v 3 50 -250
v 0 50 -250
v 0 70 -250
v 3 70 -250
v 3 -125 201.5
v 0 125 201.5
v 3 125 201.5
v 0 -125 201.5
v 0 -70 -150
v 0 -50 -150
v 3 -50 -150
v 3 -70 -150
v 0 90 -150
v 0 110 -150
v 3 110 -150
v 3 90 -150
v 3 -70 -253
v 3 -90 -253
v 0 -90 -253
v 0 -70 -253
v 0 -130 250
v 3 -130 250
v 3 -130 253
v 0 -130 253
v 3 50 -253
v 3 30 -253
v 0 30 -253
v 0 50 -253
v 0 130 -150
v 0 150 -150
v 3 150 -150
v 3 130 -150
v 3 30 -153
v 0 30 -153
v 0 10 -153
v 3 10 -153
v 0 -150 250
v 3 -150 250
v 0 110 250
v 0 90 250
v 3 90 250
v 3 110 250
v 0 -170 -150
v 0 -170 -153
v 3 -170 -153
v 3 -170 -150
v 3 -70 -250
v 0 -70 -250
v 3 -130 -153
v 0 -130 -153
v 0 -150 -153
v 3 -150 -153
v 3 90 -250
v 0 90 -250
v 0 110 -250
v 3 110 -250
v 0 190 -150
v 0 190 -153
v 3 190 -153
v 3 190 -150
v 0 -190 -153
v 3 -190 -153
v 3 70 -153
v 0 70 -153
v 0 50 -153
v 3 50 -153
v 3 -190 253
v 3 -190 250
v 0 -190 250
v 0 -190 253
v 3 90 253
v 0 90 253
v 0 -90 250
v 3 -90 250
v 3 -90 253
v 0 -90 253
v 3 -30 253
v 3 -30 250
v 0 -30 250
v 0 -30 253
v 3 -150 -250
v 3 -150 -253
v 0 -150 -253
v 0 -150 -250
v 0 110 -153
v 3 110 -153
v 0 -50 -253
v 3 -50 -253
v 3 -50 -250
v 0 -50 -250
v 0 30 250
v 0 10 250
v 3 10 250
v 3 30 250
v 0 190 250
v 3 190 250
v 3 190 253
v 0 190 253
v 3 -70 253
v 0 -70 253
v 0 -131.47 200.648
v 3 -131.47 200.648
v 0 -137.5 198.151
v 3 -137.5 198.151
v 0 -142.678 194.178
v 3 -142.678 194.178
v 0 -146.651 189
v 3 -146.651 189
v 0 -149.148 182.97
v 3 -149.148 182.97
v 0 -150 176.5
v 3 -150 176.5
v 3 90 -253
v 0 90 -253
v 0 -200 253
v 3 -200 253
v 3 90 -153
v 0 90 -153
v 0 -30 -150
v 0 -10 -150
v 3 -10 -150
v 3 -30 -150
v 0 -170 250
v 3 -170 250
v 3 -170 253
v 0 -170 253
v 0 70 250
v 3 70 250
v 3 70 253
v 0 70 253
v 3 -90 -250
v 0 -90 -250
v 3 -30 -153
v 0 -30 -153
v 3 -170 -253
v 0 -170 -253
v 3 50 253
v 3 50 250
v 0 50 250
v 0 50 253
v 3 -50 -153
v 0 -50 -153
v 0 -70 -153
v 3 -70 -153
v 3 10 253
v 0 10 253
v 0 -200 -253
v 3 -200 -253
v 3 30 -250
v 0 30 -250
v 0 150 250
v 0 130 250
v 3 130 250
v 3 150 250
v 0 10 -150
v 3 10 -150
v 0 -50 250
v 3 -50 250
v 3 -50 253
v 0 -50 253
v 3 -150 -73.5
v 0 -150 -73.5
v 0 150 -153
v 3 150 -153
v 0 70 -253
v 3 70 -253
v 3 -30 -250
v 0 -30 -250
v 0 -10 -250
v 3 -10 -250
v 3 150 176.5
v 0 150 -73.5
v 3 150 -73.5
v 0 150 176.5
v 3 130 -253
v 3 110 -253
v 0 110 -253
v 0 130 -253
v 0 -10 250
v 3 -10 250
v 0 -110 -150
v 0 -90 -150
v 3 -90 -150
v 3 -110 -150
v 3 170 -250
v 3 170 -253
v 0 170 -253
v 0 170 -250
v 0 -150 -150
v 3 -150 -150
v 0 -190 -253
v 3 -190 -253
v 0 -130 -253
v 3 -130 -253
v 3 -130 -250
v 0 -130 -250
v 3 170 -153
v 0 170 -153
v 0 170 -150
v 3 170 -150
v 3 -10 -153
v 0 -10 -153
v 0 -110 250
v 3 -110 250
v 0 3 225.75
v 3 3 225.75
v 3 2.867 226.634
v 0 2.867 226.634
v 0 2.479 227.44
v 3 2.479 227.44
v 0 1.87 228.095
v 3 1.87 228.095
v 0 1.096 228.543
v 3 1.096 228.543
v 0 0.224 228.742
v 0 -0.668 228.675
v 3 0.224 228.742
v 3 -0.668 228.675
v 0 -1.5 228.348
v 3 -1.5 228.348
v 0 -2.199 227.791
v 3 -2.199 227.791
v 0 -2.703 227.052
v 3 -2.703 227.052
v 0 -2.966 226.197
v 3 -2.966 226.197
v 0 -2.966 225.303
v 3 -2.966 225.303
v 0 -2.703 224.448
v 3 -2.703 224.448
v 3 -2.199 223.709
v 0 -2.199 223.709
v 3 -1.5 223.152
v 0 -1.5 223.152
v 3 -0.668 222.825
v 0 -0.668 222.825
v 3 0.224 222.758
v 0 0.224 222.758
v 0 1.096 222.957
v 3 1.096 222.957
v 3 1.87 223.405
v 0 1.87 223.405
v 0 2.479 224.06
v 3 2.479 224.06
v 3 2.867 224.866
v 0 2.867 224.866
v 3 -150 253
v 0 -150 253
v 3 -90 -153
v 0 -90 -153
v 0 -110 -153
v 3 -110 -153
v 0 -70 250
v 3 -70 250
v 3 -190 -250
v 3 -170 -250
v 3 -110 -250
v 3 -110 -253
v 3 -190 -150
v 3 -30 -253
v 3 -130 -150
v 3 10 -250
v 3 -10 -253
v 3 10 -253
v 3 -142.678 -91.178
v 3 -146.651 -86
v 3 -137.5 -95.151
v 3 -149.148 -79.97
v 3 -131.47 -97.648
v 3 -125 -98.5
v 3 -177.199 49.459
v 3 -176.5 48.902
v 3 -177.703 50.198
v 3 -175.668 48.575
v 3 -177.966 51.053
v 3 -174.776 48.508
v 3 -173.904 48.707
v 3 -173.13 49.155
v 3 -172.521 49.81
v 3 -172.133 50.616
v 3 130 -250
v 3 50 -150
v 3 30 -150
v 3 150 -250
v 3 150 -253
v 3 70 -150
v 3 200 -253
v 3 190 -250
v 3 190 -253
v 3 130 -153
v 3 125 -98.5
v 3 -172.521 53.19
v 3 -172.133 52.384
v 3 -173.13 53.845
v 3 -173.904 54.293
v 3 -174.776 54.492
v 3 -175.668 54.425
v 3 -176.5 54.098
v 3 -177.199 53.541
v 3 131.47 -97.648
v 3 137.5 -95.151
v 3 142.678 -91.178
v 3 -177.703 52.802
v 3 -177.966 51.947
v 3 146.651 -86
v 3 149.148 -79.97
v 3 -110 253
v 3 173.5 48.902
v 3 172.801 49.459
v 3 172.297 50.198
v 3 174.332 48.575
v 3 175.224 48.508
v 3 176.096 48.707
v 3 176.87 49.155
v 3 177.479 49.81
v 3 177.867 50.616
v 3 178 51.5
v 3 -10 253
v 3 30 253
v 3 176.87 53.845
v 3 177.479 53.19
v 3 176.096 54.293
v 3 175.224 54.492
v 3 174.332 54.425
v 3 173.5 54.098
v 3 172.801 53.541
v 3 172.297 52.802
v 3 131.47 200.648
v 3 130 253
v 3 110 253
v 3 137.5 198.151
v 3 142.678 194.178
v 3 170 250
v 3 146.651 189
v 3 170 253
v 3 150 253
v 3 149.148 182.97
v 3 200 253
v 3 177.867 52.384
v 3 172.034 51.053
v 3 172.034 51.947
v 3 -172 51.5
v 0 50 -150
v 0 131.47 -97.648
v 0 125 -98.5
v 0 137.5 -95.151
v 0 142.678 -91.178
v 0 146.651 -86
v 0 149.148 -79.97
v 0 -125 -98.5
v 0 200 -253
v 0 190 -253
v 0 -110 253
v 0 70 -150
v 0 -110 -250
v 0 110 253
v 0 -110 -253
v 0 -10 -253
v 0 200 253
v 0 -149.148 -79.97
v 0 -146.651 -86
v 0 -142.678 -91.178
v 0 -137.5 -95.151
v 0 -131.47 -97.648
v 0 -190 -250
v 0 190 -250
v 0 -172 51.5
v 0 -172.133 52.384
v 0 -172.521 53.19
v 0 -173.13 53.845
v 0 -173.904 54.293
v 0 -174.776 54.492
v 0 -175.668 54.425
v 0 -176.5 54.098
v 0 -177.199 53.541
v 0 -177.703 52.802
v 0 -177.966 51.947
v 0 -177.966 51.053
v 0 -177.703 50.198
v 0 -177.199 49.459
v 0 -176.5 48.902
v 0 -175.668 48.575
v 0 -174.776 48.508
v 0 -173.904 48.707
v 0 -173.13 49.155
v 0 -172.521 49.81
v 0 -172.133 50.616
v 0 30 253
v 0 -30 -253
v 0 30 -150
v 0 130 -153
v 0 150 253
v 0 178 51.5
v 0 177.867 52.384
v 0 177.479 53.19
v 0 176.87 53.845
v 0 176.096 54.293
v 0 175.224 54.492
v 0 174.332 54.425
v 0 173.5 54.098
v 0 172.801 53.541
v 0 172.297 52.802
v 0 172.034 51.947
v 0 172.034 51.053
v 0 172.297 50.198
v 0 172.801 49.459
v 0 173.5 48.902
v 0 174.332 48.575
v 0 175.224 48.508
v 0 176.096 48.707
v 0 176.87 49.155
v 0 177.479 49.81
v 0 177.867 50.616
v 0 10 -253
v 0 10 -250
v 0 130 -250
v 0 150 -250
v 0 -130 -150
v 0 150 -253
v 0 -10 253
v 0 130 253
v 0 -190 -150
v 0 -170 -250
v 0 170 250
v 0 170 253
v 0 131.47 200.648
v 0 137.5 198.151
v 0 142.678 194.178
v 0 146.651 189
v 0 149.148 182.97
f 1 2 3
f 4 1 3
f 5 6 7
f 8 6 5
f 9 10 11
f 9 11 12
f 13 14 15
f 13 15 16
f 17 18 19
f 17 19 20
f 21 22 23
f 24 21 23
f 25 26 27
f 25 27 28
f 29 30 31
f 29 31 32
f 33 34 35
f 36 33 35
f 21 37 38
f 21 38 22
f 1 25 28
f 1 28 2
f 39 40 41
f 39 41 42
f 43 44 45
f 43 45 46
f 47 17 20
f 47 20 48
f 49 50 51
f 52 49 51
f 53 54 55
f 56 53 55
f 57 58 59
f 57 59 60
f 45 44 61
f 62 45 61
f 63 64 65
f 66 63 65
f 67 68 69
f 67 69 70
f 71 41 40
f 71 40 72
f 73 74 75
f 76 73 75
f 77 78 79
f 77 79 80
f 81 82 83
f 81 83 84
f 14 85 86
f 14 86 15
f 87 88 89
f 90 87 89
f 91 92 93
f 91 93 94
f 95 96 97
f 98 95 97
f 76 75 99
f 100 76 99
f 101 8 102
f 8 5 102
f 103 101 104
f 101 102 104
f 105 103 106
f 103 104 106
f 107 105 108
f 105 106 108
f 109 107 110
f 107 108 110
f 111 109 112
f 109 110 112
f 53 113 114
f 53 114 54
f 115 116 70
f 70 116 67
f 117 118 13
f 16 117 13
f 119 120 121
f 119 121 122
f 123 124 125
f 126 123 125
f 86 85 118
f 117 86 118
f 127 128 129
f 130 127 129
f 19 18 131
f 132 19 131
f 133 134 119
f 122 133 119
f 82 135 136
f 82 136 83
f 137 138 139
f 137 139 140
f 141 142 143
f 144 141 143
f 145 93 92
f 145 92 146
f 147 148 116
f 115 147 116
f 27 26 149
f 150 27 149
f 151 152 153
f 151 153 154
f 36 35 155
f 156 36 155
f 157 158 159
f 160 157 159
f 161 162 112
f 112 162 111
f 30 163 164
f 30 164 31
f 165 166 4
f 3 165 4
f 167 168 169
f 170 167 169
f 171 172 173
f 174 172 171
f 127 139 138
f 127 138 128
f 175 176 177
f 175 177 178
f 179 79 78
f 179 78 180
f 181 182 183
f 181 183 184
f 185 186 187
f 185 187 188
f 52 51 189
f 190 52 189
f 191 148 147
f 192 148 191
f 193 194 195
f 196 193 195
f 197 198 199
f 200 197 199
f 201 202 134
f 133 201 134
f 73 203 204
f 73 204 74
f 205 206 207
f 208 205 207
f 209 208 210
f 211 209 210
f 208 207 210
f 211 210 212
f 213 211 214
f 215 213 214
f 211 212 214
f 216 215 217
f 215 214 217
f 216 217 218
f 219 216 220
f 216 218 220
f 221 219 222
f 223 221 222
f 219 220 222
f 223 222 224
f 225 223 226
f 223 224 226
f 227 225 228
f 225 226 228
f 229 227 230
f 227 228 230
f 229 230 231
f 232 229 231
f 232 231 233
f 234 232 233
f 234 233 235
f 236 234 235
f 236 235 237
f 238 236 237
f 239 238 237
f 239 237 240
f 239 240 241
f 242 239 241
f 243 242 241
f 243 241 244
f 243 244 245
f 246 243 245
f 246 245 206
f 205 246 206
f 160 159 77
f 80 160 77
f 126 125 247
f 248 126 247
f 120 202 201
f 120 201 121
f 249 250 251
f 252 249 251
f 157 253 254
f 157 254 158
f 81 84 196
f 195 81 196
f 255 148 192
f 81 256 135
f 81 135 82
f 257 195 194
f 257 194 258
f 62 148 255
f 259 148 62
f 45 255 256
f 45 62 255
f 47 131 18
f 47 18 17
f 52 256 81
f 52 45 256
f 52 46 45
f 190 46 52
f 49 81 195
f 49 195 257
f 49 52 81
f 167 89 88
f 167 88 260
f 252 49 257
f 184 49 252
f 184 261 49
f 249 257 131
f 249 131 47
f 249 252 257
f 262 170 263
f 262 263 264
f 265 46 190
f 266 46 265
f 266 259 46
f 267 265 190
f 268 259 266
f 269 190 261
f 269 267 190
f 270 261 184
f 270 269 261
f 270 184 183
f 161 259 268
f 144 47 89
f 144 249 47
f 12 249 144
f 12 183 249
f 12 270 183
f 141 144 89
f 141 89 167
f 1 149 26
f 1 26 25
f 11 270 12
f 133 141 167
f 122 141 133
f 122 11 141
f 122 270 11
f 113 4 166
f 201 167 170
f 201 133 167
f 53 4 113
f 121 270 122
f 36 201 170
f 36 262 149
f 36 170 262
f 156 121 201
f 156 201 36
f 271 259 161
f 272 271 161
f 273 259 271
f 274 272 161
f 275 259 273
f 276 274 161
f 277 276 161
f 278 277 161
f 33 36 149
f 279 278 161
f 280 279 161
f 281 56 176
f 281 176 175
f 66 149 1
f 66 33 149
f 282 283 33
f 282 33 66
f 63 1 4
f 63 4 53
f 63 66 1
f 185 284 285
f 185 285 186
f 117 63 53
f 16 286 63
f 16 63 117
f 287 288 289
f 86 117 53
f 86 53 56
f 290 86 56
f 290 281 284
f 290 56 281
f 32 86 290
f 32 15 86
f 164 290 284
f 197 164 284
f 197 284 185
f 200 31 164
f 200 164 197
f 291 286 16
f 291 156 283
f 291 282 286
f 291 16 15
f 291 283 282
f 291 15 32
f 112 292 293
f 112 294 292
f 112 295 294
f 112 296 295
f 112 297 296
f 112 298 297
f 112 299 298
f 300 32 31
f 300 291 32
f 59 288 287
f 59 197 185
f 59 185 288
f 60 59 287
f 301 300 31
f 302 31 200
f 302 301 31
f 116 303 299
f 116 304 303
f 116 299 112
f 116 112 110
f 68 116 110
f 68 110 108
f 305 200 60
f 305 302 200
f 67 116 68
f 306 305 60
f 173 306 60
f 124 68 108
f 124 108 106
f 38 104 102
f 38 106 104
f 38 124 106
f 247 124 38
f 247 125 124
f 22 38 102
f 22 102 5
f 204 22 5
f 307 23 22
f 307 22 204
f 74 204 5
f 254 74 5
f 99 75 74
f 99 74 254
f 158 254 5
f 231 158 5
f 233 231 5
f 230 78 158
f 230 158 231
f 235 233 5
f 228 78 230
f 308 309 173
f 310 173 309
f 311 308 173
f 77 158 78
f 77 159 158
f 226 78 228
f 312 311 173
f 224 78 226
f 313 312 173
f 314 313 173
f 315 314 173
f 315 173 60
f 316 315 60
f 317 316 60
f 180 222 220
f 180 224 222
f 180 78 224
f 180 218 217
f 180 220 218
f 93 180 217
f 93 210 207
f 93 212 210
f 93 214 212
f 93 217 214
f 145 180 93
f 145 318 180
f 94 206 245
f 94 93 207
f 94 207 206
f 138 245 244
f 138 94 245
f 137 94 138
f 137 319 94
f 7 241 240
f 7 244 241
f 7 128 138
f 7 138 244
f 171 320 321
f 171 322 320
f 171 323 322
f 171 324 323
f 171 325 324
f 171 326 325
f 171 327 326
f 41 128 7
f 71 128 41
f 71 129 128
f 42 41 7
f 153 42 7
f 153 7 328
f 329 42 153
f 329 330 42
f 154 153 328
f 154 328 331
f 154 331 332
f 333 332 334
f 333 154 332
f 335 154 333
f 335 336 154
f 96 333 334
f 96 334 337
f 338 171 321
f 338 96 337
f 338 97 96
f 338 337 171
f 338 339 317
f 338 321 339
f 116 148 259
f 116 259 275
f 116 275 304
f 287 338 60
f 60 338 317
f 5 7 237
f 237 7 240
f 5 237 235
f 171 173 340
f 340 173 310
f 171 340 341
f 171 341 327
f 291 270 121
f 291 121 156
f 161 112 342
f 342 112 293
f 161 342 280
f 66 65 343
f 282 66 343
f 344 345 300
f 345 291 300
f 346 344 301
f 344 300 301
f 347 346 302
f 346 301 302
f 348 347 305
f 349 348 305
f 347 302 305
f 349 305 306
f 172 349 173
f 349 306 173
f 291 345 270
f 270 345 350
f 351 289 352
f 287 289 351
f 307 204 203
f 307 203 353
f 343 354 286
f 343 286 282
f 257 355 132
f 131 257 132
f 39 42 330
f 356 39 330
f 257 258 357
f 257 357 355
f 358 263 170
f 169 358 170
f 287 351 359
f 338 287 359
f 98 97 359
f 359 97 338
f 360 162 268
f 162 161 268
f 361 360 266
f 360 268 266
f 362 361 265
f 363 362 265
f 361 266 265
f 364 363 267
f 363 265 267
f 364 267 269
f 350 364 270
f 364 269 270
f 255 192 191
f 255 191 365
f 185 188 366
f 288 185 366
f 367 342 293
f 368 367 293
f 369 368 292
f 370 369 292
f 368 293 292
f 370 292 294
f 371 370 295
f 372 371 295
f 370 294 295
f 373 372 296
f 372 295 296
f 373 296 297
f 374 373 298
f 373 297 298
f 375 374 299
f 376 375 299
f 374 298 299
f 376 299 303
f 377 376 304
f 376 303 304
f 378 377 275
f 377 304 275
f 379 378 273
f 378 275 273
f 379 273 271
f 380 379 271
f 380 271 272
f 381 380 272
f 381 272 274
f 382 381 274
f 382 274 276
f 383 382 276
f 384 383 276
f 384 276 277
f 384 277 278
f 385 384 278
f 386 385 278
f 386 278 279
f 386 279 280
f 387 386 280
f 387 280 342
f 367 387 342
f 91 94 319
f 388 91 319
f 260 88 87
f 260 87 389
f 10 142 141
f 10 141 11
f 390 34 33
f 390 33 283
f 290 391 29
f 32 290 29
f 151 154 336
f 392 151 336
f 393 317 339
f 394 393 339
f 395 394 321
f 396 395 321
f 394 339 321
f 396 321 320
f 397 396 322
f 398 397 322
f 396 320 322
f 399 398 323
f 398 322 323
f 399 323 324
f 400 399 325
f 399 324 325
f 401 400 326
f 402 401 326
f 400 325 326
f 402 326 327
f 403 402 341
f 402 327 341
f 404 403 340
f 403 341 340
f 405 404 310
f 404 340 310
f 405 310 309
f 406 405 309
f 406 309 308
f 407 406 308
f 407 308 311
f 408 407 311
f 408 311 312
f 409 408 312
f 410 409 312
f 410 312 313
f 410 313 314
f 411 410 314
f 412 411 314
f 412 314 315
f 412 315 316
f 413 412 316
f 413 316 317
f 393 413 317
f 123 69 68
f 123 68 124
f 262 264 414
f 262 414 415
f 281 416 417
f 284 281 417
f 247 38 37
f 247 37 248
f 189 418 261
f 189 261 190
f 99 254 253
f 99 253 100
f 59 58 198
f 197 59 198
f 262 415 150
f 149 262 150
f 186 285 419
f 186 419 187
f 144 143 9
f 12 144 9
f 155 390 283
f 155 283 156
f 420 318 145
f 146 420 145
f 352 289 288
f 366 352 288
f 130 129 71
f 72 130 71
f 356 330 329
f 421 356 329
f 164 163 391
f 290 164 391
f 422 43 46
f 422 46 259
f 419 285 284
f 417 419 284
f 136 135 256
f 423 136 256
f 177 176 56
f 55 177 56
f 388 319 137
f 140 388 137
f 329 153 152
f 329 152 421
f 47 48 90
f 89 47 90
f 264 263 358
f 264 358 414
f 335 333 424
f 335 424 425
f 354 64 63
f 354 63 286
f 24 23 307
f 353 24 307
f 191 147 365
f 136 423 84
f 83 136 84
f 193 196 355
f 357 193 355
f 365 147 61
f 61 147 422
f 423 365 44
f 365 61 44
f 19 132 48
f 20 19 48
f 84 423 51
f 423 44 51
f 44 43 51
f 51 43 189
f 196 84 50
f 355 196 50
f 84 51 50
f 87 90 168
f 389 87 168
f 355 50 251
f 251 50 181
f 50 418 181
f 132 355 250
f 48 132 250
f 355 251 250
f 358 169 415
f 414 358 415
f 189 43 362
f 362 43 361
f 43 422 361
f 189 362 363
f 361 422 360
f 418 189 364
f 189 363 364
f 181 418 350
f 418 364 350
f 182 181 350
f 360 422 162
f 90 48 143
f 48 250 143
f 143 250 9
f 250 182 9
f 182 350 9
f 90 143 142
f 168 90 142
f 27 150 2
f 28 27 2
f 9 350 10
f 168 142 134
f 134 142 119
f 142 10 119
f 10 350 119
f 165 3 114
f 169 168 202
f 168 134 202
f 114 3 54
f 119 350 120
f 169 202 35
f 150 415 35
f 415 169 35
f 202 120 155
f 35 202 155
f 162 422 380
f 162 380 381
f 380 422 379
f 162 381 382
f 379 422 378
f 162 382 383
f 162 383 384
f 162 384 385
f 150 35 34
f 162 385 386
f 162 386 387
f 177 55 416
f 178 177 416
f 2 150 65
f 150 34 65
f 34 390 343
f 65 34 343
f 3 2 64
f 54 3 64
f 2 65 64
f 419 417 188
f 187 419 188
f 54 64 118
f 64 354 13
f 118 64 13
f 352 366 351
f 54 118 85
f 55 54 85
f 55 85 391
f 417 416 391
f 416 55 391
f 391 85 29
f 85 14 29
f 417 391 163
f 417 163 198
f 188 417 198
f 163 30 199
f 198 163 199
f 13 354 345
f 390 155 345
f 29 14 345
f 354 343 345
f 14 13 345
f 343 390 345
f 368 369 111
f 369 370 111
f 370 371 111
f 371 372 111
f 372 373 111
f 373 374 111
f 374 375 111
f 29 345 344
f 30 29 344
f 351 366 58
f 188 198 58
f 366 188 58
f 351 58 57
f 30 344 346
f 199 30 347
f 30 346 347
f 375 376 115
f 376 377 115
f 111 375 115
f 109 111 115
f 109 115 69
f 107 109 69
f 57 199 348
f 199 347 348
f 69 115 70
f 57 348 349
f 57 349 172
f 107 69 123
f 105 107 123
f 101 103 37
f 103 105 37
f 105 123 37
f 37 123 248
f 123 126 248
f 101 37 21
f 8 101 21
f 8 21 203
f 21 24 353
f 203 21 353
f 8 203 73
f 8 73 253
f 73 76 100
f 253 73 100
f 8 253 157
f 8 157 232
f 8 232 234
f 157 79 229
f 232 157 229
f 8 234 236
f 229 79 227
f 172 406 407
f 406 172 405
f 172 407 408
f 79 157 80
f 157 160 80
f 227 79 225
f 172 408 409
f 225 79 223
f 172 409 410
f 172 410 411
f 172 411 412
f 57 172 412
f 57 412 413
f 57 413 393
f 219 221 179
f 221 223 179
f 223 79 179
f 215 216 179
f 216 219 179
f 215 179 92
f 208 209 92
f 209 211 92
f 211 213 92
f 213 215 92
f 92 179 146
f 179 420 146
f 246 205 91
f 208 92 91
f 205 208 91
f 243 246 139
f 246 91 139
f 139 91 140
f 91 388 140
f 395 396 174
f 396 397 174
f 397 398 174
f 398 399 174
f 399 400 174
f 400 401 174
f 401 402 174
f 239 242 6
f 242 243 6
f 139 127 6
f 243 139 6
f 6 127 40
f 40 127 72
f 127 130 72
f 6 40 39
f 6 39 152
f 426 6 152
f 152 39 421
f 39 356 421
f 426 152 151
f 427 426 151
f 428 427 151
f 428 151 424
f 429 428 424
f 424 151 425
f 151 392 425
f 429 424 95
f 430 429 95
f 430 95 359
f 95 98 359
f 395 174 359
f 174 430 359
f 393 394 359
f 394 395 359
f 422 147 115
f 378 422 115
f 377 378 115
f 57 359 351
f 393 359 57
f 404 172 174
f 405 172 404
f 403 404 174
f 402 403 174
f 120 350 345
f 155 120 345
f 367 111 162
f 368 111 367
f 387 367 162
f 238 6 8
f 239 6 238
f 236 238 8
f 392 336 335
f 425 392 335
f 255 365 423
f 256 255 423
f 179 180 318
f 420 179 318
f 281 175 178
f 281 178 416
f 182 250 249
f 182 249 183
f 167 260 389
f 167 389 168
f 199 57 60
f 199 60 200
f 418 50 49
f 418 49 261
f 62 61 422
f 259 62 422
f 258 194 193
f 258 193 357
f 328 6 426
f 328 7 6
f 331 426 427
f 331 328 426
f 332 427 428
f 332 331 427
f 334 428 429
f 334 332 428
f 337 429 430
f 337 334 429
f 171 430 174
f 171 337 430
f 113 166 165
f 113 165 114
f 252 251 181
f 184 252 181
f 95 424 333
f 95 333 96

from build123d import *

# Parameters (mm, degrees)
F0_W      = 400
F0_H      = 500
F1_DEPTH  = 3
F2_W      = 10
F2_H      = 3
F2_W_2    = 20
F3_DEPTH  = 3
F4_W      = 20
F4_H      = 3
F5_DEPTH  = 3.001
F6_W      = 300
F6_H      = 300
F7_DEPTH  = 25
F8_R      = 25
F9_R      = 3
F10_DEPTH = 25


with BuildPart() as f1:
    # F0 (on Right) → F1 (new body)
    with BuildSketch(Plane.YZ):
        Rectangle(F0_W, F0_H)
    extrude(amount=F1_DEPTH)

    # F2 (on face) → F3 (join, through all)
    with BuildSketch(Plane.YZ.offset(3)):
        with Locations((-195, 251.5)):
            Rectangle(F2_W, F2_H)
        with Locations((-160, 251.5)):
            Rectangle(F2_W_2, F2_H)
        with Locations((-120, 251.5)):
            Rectangle(F2_W_2, F2_H)
        with Locations((-80, 251.5)):
            Rectangle(F2_W_2, F2_H)
        with Locations((-40, 251.5)):
            Rectangle(F2_W_2, F2_H)
        with Locations((0, 251.5)):
            Rectangle(F2_W_2, F2_H)
        with Locations((40, 251.5)):
            Rectangle(F2_W_2, F2_H)
        with Locations((80, 251.5)):
            Rectangle(F2_W_2, F2_H)
        with Locations((120, 251.5)):
            Rectangle(F2_W_2, F2_H)
        with Locations((160, 251.5)):
            Rectangle(F2_W_2, F2_H)
        with Locations((195, 251.5)):
            Rectangle(F2_W, F2_H)
        with Locations((-195, -251.5)):
            Rectangle(F2_W, F2_H)
        with Locations((-160, -251.5)):
            Rectangle(F2_W_2, F2_H)
        with Locations((-120, -251.5)):
            Rectangle(F2_W_2, F2_H)
        with Locations((195, -251.5)):
            Rectangle(F2_W, F2_H)
        with Locations((-80, -251.5)):
            Rectangle(F2_W_2, F2_H)
        with Locations((160, -251.5)):
            Rectangle(F2_W_2, F2_H)
        with Locations((0, -251.5)):
            Rectangle(F2_W_2, F2_H)
        with Locations((120, -251.5)):
            Rectangle(F2_W_2, F2_H)
        with Locations((-40, -251.5)):
            Rectangle(F2_W_2, F2_H)
        with Locations((40, -251.5)):
            Rectangle(F2_W_2, F2_H)
        with Locations((80, -251.5)):
            Rectangle(F2_W_2, F2_H)
    extrude(amount=-F3_DEPTH)

    # F4 (on face) → F5 (cut, through all)
    with BuildSketch(Plane(origin=(0, 0, 0), x_dir=(0, -1, 0), z_dir=(-1, 0, 0))):
        with Locations((-180, -151.5)):
            Rectangle(F4_W, F4_H)
        with Locations((-140, -151.5)):
            Rectangle(F4_W, F4_H)
        with Locations((-100, -151.5)):
            Rectangle(F4_W, F4_H)
        with Locations((-60, -151.5)):
            Rectangle(F4_W, F4_H)
        with Locations((-20, -151.5)):
            Rectangle(F4_W, F4_H)
        with Locations((20, -151.5)):
            Rectangle(F4_W, F4_H)
        with Locations((60, -151.5)):
            Rectangle(F4_W, F4_H)
        with Locations((100, -151.5)):
            Rectangle(F4_W, F4_H)
        with Locations((140, -151.5)):
            Rectangle(F4_W, F4_H)
        with Locations((180, -151.5)):
            Rectangle(F4_W, F4_H)
    extrude(amount=-F5_DEPTH, mode=Mode.SUBTRACT)

    # F6 (on face) → F7 (cut)
    with BuildSketch(Plane(origin=(0, 0, 0), x_dir=(0, -1, 0), z_dir=(-1, 0, 0))):
        with Locations((0, 51.5)):
            Rectangle(F6_W, F6_H)
    extrude(amount=-F7_DEPTH, mode=Mode.SUBTRACT)

    # F8
    f8_edges = [f1.edges().sort_by_distance(p)[0] for p in [
        (1.5, 150, 201.5),
        (1.5, -150, 201.5),
        (1.5, -150, -98.5),
        (1.5, 150, -98.5),
    ]]
    fillet(f8_edges, radius=F8_R)

    # F9 (on face) → F10 (cut)
    with BuildSketch(Plane.YZ.offset(3)):
        with Locations((0, 225.75)):
            Circle(F9_R)
        with Locations((-175, 51.5)):
            Circle(F9_R)
        with Locations((175, 51.5)):
            Circle(F9_R)
    extrude(amount=-F10_DEPTH, mode=Mode.SUBTRACT)


solid = f1.part
